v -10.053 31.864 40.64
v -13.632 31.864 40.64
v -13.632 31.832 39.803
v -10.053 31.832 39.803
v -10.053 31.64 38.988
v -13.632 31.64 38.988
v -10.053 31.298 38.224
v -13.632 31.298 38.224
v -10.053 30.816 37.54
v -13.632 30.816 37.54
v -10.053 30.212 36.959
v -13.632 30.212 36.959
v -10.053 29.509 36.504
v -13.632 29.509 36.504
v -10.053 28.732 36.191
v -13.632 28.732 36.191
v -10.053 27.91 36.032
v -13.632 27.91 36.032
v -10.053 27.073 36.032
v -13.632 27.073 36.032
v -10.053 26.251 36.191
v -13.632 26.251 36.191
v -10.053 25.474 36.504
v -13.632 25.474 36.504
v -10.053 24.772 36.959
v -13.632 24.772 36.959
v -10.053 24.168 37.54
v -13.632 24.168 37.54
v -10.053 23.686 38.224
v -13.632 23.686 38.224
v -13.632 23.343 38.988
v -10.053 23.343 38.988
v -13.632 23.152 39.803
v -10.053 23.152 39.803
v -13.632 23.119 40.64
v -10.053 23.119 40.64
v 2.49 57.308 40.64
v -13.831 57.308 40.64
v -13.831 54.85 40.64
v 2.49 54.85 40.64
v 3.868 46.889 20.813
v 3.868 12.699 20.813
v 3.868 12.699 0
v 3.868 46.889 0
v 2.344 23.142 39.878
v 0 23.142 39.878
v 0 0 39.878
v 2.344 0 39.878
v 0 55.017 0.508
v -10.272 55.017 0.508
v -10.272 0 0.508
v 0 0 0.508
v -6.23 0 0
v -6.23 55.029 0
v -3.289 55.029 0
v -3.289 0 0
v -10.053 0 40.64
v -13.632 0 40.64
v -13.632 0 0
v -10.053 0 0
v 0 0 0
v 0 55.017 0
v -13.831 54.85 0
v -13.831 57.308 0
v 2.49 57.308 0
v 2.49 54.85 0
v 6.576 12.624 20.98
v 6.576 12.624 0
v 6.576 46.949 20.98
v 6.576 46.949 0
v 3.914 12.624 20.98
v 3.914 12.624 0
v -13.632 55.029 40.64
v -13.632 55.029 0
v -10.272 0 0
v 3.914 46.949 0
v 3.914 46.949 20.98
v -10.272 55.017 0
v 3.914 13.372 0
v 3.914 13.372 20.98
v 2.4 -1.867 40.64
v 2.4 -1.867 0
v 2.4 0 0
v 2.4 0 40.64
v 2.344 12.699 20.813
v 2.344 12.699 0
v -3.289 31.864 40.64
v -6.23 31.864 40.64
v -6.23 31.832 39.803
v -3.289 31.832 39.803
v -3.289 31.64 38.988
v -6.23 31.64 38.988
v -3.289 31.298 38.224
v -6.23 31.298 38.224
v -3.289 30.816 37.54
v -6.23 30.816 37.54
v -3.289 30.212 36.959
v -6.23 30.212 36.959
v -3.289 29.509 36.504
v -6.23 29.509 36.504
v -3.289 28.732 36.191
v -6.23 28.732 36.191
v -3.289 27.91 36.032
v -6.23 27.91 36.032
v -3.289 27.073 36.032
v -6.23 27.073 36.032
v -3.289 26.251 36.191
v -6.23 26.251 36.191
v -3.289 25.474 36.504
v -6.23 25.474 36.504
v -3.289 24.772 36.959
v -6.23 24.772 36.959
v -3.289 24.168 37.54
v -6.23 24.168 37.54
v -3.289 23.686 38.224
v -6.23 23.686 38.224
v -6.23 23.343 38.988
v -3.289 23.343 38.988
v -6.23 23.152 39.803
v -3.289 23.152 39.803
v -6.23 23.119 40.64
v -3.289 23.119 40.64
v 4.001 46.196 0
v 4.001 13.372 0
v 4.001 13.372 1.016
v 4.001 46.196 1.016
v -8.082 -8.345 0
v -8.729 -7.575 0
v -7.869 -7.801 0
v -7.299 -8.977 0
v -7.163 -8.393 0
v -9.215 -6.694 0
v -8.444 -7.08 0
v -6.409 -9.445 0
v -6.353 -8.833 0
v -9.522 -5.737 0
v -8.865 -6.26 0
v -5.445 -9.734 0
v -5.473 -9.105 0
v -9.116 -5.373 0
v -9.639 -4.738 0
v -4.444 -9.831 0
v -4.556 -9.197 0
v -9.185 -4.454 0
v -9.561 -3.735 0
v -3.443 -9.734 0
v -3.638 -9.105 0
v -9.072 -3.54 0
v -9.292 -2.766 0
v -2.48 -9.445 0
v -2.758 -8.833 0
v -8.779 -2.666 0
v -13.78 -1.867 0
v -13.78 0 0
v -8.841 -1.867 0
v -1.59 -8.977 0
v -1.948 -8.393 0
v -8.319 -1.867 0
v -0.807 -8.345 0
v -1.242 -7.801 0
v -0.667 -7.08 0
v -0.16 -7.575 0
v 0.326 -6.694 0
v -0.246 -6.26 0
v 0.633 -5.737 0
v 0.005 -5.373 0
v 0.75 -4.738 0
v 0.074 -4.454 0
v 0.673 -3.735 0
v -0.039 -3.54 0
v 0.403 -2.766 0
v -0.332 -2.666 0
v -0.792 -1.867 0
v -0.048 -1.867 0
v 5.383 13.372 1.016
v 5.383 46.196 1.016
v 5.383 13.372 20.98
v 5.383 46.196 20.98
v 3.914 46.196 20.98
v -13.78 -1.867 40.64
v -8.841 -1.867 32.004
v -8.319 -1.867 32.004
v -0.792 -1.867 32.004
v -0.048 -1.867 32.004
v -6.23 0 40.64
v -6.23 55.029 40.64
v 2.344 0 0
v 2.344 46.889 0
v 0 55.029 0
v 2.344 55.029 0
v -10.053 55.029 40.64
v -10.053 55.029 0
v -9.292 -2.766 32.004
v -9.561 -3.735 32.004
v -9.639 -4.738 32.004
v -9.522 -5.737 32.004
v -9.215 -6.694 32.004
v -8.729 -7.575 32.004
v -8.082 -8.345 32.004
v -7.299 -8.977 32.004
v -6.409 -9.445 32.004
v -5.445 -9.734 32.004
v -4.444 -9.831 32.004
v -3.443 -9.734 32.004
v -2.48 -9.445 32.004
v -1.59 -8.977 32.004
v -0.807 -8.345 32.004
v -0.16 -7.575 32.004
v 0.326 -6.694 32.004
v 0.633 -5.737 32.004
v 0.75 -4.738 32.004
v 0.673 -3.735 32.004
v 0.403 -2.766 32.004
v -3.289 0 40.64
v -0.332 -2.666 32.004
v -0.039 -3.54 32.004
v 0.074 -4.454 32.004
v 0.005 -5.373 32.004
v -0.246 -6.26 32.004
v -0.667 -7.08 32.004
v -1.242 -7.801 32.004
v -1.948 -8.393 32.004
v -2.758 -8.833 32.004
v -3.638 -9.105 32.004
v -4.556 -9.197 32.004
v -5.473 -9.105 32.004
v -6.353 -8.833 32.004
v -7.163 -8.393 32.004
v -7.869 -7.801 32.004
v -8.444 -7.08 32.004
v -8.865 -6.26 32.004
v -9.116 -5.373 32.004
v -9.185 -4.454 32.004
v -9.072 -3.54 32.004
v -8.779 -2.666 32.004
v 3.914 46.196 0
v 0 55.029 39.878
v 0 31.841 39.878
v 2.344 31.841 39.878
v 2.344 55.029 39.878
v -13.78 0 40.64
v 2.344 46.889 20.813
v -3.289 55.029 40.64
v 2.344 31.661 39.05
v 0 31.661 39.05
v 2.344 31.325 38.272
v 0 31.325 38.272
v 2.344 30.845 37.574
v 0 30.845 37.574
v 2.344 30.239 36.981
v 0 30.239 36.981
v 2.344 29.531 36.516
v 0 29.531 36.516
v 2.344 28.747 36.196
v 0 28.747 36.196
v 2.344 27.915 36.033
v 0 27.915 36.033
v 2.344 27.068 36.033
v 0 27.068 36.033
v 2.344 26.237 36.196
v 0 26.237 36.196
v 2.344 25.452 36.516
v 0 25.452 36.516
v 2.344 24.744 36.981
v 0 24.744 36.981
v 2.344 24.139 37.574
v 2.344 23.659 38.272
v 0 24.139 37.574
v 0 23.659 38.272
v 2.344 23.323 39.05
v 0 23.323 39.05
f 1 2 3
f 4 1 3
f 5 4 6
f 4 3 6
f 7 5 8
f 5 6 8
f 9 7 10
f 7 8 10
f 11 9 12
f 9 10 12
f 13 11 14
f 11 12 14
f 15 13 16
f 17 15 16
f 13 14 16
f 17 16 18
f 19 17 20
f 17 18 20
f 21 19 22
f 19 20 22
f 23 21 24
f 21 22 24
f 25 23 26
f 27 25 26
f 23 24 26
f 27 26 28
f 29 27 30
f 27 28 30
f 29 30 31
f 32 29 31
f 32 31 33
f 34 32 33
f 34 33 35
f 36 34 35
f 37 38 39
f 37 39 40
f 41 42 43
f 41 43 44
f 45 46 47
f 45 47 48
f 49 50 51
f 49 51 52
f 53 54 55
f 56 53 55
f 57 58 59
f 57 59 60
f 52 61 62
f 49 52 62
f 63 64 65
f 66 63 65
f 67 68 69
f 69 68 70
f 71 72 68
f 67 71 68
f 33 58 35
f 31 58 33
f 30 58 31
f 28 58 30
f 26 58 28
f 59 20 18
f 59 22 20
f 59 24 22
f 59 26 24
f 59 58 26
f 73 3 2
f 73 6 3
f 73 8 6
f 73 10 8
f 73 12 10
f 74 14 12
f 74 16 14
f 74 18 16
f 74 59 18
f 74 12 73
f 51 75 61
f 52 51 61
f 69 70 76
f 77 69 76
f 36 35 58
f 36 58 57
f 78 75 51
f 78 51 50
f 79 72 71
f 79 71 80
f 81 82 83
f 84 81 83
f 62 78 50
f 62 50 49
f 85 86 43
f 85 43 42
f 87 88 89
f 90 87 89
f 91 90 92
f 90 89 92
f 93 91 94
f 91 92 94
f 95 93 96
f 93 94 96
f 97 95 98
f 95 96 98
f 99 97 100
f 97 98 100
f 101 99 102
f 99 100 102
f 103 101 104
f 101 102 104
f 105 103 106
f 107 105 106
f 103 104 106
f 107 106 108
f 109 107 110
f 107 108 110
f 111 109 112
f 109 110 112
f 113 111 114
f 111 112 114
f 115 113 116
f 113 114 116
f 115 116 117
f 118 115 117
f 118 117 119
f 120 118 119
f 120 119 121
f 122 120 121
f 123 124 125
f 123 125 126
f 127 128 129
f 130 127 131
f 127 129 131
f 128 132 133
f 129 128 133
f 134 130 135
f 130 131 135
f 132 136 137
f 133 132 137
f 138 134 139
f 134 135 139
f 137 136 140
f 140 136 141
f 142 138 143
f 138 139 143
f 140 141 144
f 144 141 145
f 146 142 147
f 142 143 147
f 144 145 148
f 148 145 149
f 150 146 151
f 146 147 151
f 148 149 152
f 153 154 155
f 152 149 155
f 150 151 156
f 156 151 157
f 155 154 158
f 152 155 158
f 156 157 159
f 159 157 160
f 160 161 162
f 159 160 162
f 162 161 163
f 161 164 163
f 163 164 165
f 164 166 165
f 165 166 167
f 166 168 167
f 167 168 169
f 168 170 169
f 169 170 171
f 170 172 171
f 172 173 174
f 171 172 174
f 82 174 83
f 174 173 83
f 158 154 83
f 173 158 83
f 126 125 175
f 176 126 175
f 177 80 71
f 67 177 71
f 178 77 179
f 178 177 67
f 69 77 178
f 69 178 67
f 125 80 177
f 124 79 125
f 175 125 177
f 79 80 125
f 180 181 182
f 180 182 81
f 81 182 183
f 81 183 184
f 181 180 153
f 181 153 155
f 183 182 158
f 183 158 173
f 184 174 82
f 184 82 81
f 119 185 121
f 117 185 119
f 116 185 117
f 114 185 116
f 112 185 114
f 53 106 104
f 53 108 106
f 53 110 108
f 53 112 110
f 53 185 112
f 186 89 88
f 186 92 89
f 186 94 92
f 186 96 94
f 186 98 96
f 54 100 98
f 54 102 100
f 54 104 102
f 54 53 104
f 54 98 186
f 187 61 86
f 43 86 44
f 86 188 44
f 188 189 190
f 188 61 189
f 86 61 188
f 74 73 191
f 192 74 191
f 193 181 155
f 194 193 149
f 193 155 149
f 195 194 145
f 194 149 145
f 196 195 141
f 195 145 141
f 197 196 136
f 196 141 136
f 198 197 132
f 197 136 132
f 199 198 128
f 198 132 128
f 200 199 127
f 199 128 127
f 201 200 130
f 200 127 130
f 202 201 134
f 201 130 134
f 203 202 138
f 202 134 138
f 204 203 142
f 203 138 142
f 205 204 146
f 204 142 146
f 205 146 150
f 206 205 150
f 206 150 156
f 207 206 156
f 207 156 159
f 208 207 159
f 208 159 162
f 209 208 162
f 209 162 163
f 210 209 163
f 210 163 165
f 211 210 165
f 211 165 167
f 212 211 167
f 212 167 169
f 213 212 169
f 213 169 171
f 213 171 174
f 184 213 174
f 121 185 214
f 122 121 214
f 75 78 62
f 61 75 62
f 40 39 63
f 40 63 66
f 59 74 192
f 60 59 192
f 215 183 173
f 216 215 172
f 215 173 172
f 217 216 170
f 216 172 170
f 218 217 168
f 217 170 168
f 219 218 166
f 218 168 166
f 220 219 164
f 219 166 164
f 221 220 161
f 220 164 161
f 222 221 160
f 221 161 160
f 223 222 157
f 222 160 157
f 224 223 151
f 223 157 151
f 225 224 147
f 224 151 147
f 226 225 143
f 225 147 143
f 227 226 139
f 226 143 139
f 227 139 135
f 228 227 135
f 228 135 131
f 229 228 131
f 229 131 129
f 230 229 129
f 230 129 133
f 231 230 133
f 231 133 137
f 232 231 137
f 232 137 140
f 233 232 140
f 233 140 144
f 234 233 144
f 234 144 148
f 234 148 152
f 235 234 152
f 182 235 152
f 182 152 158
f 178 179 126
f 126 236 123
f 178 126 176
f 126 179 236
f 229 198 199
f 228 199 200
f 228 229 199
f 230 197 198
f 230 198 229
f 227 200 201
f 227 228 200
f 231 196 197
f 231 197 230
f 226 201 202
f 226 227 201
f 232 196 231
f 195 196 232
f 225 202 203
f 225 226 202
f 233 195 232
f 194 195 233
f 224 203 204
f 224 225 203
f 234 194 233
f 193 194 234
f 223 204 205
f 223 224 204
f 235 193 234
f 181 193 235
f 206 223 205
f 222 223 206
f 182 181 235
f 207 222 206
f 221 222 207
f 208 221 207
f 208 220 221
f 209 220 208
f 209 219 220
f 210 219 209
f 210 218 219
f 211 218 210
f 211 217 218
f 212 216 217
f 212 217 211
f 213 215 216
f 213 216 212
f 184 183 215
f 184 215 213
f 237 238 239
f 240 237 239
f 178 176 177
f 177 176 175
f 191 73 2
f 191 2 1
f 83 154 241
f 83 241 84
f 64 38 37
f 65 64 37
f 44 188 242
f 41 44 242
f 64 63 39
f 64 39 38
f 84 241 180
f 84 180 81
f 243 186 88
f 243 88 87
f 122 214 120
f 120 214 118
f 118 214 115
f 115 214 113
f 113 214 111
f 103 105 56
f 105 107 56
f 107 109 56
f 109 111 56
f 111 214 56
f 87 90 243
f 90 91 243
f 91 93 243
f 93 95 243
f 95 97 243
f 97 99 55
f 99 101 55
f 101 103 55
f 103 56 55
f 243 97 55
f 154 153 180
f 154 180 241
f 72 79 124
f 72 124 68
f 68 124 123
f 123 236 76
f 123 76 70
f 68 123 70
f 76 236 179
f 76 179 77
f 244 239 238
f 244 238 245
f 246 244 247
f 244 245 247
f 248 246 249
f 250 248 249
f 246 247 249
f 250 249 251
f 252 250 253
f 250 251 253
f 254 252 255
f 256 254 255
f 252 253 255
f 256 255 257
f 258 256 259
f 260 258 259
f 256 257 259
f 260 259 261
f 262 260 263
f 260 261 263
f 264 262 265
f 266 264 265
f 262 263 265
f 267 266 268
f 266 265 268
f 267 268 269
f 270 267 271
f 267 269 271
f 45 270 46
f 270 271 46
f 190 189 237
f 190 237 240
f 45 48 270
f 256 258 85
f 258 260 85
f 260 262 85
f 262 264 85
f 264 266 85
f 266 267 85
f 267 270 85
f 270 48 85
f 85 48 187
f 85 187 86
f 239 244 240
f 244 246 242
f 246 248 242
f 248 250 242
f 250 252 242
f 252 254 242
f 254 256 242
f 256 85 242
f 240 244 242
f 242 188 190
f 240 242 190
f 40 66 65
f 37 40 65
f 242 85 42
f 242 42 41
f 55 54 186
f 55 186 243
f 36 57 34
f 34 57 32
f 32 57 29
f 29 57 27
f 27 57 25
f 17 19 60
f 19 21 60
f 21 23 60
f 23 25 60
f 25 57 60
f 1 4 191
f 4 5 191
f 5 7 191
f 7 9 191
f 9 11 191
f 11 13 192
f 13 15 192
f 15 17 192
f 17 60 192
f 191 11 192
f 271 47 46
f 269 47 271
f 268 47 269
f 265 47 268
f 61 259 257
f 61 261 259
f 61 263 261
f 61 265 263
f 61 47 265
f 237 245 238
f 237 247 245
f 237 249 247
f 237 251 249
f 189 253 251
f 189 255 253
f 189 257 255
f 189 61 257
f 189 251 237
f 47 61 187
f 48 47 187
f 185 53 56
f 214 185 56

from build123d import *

# Parameters (mm, degrees)
F0_W      = 2.3441631347
F0_H      = 55.0290979445
F1_DEPTH  = 39.878
F2_W      = 2.9410969
F2_H      = 55.0290979445
F3_DEPTH  = 40.64
F2_W_2    = 3.5789022222
F4_W      = 16.1798002664
F4_H      = 1.8669000128
F5_DEPTH  = 40.64
F6_W      = 16.3212304469
F6_H      = 2.4581104517
F7_DEPTH  = 40.64
F9_DEPTH  = 1524
F10_W     = 10.2717103437
F10_H     = 55.0169795752
F11_DEPTH = 0.508
F12_W     = 34.1899227351
F12_H     = 20.8132024854
F13_DEPTH = 1.524
F14_W     = 1.1937352829
F14_H     = 0.7482906803
F14_H_2   = 32.8233968467
F14_H_3   = 0.7529705763
F14_W_2   = 1.468735747
F15_DEPTH = 20.9804
F16_W     = 2.3114006035
F16_H     = 33.4264012054
F17_DEPTH = 1.016
F19_DEPTH = 32.004


with BuildPart() as f1:
    # F0 (on Top) → F1 (new body)
    with BuildSketch(Plane.XY):
        with Locations((1.1720815673, 27.5145489722)):
            Rectangle(F0_W, F0_H)
    extrude(amount=F1_DEPTH)


with BuildPart() as f3:
    # F2 (on Top) → F3 (new body)
    with BuildSketch(Plane.XY):
        with Locations((-4.7598482342, 27.5145489722)):
            Rectangle(F2_W, F2_H)
    extrude(amount=F3_DEPTH)


with BuildPart() as f3b:
    # F2 (on Top) → F3, piece 2 (new body)
    with BuildSketch(Plane.XY):
        with Locations((-11.8424394168, 27.5145489722)):
            Rectangle(F2_W_2, F2_H)
    extrude(amount=F3_DEPTH)


with BuildPart() as f5:
    # F4 (on Top) → F5 (new body)
    with BuildSketch(Plane.XY):
        with Locations((-5.6896003662, -0.9334500064)):
            Rectangle(F4_W, F4_H)
    extrude(amount=F5_DEPTH)

    # F18 (on Top) → F19 (join)
    with BuildSketch(Plane.XY):
        with BuildLine():
            Line((-0.5623976467, -1.1822324013), (-8.4474748001, -1.323352335))
            ThreePointArc((-8.4474748001, -1.323352335), (-4.3514221015, -9.830394863), (-0.5623976467, -1.1822324013))
        make_face()
        with BuildLine():
            ThreePointArc((-1.0391375981, -1.5516541898), (-4.4550866105, -9.1954568912), (-8.1994263455, -1.7070426838))
            Line((-8.1994263455, -1.7070426838), (-1.0391375981, -1.5516541898))
        make_face(mode=Mode.SUBTRACT)
    extrude(amount=F19_DEPTH)


with BuildPart() as f7:
    # F6 (on Top) → F7 (new body)
    with BuildSketch(Plane.XY):
        with Locations((-5.6702439906, 56.0785979033)):
            Rectangle(F6_W, F6_H)
    extrude(amount=F7_DEPTH)


with BuildPart() as f9_tool:
    # F8 (on face) → F9 (new body)
    with BuildSketch(Plane(origin=(-13.6318905279, 0, 0), x_dir=(0, -1, 0), z_dir=(-1, 0, 0))):
        with BuildLine():
            Line((-23.1191683561, 40.64), (-31.8644456565, 40.64))
            ThreePointArc((-31.8644456565, 40.64), (-27.4918070063, 36.012069872), (-23.1191683561, 40.64))
        make_face()
    extrude(amount=-F9_DEPTH)


with BuildPart() as f1_1:
    add(f1.part)

    # F9: cut by f9_tool
    add(f9_tool.part, mode=Mode.SUBTRACT)

    # F12 (on face) → F13 (join)
    with BuildSketch(Plane.YZ.offset(2.3441631347)):
        with Locations((29.7937216237, 10.4066012427)):
            Rectangle(F12_W, F12_H)
    extrude(amount=F13_DEPTH)


with BuildPart() as f3_1:
    add(f3.part)

    # F9: cut by f9_tool
    add(f9_tool.part, mode=Mode.SUBTRACT)


with BuildPart() as f3b_1:
    add(f3b.part)

    # F9: cut by f9_tool
    add(f9_tool.part, mode=Mode.SUBTRACT)


with BuildPart() as f11:
    # F10 (on Top) → F11 (new body)
    with BuildSketch(Plane.XY):
        with Locations((-5.1358551718, 27.5084897876)):
            Rectangle(F10_W, F10_H)
    extrude(amount=F11_DEPTH)


with BuildPart() as f15:
    # F14 (on Top) → F15 (new body)
    with BuildSketch(Plane.XY):
        with Locations((5.9795549605, 12.9982368089)):
            Rectangle(F14_W, F14_H)
        with Locations((5.9795549605, 29.7840805724)):
            Rectangle(F14_W, F14_H_2)
        with Locations((5.9795549605, 46.5722642839)):
            Rectangle(F14_W, F14_H_3)
        with Locations((4.6483194456, 46.5722642839)):
            Rectangle(F14_W_2, F14_H_3)
        with Locations((4.6483194456, 12.9982368089)):
            Rectangle(F14_W_2, F14_H)
    extrude(amount=F15_DEPTH)

    # F16 (on Top) → F17 (join)
    with BuildSketch(Plane.XY):
        with Locations((5.1562010776, 29.9593000673)):
            Rectangle(F16_W, F16_H)
    extrude(amount=F17_DEPTH)


solid = Compound([f5.part, f7.part, f1_1.part, f3_1.part, f3b_1.part, f11.part, f15.part])
